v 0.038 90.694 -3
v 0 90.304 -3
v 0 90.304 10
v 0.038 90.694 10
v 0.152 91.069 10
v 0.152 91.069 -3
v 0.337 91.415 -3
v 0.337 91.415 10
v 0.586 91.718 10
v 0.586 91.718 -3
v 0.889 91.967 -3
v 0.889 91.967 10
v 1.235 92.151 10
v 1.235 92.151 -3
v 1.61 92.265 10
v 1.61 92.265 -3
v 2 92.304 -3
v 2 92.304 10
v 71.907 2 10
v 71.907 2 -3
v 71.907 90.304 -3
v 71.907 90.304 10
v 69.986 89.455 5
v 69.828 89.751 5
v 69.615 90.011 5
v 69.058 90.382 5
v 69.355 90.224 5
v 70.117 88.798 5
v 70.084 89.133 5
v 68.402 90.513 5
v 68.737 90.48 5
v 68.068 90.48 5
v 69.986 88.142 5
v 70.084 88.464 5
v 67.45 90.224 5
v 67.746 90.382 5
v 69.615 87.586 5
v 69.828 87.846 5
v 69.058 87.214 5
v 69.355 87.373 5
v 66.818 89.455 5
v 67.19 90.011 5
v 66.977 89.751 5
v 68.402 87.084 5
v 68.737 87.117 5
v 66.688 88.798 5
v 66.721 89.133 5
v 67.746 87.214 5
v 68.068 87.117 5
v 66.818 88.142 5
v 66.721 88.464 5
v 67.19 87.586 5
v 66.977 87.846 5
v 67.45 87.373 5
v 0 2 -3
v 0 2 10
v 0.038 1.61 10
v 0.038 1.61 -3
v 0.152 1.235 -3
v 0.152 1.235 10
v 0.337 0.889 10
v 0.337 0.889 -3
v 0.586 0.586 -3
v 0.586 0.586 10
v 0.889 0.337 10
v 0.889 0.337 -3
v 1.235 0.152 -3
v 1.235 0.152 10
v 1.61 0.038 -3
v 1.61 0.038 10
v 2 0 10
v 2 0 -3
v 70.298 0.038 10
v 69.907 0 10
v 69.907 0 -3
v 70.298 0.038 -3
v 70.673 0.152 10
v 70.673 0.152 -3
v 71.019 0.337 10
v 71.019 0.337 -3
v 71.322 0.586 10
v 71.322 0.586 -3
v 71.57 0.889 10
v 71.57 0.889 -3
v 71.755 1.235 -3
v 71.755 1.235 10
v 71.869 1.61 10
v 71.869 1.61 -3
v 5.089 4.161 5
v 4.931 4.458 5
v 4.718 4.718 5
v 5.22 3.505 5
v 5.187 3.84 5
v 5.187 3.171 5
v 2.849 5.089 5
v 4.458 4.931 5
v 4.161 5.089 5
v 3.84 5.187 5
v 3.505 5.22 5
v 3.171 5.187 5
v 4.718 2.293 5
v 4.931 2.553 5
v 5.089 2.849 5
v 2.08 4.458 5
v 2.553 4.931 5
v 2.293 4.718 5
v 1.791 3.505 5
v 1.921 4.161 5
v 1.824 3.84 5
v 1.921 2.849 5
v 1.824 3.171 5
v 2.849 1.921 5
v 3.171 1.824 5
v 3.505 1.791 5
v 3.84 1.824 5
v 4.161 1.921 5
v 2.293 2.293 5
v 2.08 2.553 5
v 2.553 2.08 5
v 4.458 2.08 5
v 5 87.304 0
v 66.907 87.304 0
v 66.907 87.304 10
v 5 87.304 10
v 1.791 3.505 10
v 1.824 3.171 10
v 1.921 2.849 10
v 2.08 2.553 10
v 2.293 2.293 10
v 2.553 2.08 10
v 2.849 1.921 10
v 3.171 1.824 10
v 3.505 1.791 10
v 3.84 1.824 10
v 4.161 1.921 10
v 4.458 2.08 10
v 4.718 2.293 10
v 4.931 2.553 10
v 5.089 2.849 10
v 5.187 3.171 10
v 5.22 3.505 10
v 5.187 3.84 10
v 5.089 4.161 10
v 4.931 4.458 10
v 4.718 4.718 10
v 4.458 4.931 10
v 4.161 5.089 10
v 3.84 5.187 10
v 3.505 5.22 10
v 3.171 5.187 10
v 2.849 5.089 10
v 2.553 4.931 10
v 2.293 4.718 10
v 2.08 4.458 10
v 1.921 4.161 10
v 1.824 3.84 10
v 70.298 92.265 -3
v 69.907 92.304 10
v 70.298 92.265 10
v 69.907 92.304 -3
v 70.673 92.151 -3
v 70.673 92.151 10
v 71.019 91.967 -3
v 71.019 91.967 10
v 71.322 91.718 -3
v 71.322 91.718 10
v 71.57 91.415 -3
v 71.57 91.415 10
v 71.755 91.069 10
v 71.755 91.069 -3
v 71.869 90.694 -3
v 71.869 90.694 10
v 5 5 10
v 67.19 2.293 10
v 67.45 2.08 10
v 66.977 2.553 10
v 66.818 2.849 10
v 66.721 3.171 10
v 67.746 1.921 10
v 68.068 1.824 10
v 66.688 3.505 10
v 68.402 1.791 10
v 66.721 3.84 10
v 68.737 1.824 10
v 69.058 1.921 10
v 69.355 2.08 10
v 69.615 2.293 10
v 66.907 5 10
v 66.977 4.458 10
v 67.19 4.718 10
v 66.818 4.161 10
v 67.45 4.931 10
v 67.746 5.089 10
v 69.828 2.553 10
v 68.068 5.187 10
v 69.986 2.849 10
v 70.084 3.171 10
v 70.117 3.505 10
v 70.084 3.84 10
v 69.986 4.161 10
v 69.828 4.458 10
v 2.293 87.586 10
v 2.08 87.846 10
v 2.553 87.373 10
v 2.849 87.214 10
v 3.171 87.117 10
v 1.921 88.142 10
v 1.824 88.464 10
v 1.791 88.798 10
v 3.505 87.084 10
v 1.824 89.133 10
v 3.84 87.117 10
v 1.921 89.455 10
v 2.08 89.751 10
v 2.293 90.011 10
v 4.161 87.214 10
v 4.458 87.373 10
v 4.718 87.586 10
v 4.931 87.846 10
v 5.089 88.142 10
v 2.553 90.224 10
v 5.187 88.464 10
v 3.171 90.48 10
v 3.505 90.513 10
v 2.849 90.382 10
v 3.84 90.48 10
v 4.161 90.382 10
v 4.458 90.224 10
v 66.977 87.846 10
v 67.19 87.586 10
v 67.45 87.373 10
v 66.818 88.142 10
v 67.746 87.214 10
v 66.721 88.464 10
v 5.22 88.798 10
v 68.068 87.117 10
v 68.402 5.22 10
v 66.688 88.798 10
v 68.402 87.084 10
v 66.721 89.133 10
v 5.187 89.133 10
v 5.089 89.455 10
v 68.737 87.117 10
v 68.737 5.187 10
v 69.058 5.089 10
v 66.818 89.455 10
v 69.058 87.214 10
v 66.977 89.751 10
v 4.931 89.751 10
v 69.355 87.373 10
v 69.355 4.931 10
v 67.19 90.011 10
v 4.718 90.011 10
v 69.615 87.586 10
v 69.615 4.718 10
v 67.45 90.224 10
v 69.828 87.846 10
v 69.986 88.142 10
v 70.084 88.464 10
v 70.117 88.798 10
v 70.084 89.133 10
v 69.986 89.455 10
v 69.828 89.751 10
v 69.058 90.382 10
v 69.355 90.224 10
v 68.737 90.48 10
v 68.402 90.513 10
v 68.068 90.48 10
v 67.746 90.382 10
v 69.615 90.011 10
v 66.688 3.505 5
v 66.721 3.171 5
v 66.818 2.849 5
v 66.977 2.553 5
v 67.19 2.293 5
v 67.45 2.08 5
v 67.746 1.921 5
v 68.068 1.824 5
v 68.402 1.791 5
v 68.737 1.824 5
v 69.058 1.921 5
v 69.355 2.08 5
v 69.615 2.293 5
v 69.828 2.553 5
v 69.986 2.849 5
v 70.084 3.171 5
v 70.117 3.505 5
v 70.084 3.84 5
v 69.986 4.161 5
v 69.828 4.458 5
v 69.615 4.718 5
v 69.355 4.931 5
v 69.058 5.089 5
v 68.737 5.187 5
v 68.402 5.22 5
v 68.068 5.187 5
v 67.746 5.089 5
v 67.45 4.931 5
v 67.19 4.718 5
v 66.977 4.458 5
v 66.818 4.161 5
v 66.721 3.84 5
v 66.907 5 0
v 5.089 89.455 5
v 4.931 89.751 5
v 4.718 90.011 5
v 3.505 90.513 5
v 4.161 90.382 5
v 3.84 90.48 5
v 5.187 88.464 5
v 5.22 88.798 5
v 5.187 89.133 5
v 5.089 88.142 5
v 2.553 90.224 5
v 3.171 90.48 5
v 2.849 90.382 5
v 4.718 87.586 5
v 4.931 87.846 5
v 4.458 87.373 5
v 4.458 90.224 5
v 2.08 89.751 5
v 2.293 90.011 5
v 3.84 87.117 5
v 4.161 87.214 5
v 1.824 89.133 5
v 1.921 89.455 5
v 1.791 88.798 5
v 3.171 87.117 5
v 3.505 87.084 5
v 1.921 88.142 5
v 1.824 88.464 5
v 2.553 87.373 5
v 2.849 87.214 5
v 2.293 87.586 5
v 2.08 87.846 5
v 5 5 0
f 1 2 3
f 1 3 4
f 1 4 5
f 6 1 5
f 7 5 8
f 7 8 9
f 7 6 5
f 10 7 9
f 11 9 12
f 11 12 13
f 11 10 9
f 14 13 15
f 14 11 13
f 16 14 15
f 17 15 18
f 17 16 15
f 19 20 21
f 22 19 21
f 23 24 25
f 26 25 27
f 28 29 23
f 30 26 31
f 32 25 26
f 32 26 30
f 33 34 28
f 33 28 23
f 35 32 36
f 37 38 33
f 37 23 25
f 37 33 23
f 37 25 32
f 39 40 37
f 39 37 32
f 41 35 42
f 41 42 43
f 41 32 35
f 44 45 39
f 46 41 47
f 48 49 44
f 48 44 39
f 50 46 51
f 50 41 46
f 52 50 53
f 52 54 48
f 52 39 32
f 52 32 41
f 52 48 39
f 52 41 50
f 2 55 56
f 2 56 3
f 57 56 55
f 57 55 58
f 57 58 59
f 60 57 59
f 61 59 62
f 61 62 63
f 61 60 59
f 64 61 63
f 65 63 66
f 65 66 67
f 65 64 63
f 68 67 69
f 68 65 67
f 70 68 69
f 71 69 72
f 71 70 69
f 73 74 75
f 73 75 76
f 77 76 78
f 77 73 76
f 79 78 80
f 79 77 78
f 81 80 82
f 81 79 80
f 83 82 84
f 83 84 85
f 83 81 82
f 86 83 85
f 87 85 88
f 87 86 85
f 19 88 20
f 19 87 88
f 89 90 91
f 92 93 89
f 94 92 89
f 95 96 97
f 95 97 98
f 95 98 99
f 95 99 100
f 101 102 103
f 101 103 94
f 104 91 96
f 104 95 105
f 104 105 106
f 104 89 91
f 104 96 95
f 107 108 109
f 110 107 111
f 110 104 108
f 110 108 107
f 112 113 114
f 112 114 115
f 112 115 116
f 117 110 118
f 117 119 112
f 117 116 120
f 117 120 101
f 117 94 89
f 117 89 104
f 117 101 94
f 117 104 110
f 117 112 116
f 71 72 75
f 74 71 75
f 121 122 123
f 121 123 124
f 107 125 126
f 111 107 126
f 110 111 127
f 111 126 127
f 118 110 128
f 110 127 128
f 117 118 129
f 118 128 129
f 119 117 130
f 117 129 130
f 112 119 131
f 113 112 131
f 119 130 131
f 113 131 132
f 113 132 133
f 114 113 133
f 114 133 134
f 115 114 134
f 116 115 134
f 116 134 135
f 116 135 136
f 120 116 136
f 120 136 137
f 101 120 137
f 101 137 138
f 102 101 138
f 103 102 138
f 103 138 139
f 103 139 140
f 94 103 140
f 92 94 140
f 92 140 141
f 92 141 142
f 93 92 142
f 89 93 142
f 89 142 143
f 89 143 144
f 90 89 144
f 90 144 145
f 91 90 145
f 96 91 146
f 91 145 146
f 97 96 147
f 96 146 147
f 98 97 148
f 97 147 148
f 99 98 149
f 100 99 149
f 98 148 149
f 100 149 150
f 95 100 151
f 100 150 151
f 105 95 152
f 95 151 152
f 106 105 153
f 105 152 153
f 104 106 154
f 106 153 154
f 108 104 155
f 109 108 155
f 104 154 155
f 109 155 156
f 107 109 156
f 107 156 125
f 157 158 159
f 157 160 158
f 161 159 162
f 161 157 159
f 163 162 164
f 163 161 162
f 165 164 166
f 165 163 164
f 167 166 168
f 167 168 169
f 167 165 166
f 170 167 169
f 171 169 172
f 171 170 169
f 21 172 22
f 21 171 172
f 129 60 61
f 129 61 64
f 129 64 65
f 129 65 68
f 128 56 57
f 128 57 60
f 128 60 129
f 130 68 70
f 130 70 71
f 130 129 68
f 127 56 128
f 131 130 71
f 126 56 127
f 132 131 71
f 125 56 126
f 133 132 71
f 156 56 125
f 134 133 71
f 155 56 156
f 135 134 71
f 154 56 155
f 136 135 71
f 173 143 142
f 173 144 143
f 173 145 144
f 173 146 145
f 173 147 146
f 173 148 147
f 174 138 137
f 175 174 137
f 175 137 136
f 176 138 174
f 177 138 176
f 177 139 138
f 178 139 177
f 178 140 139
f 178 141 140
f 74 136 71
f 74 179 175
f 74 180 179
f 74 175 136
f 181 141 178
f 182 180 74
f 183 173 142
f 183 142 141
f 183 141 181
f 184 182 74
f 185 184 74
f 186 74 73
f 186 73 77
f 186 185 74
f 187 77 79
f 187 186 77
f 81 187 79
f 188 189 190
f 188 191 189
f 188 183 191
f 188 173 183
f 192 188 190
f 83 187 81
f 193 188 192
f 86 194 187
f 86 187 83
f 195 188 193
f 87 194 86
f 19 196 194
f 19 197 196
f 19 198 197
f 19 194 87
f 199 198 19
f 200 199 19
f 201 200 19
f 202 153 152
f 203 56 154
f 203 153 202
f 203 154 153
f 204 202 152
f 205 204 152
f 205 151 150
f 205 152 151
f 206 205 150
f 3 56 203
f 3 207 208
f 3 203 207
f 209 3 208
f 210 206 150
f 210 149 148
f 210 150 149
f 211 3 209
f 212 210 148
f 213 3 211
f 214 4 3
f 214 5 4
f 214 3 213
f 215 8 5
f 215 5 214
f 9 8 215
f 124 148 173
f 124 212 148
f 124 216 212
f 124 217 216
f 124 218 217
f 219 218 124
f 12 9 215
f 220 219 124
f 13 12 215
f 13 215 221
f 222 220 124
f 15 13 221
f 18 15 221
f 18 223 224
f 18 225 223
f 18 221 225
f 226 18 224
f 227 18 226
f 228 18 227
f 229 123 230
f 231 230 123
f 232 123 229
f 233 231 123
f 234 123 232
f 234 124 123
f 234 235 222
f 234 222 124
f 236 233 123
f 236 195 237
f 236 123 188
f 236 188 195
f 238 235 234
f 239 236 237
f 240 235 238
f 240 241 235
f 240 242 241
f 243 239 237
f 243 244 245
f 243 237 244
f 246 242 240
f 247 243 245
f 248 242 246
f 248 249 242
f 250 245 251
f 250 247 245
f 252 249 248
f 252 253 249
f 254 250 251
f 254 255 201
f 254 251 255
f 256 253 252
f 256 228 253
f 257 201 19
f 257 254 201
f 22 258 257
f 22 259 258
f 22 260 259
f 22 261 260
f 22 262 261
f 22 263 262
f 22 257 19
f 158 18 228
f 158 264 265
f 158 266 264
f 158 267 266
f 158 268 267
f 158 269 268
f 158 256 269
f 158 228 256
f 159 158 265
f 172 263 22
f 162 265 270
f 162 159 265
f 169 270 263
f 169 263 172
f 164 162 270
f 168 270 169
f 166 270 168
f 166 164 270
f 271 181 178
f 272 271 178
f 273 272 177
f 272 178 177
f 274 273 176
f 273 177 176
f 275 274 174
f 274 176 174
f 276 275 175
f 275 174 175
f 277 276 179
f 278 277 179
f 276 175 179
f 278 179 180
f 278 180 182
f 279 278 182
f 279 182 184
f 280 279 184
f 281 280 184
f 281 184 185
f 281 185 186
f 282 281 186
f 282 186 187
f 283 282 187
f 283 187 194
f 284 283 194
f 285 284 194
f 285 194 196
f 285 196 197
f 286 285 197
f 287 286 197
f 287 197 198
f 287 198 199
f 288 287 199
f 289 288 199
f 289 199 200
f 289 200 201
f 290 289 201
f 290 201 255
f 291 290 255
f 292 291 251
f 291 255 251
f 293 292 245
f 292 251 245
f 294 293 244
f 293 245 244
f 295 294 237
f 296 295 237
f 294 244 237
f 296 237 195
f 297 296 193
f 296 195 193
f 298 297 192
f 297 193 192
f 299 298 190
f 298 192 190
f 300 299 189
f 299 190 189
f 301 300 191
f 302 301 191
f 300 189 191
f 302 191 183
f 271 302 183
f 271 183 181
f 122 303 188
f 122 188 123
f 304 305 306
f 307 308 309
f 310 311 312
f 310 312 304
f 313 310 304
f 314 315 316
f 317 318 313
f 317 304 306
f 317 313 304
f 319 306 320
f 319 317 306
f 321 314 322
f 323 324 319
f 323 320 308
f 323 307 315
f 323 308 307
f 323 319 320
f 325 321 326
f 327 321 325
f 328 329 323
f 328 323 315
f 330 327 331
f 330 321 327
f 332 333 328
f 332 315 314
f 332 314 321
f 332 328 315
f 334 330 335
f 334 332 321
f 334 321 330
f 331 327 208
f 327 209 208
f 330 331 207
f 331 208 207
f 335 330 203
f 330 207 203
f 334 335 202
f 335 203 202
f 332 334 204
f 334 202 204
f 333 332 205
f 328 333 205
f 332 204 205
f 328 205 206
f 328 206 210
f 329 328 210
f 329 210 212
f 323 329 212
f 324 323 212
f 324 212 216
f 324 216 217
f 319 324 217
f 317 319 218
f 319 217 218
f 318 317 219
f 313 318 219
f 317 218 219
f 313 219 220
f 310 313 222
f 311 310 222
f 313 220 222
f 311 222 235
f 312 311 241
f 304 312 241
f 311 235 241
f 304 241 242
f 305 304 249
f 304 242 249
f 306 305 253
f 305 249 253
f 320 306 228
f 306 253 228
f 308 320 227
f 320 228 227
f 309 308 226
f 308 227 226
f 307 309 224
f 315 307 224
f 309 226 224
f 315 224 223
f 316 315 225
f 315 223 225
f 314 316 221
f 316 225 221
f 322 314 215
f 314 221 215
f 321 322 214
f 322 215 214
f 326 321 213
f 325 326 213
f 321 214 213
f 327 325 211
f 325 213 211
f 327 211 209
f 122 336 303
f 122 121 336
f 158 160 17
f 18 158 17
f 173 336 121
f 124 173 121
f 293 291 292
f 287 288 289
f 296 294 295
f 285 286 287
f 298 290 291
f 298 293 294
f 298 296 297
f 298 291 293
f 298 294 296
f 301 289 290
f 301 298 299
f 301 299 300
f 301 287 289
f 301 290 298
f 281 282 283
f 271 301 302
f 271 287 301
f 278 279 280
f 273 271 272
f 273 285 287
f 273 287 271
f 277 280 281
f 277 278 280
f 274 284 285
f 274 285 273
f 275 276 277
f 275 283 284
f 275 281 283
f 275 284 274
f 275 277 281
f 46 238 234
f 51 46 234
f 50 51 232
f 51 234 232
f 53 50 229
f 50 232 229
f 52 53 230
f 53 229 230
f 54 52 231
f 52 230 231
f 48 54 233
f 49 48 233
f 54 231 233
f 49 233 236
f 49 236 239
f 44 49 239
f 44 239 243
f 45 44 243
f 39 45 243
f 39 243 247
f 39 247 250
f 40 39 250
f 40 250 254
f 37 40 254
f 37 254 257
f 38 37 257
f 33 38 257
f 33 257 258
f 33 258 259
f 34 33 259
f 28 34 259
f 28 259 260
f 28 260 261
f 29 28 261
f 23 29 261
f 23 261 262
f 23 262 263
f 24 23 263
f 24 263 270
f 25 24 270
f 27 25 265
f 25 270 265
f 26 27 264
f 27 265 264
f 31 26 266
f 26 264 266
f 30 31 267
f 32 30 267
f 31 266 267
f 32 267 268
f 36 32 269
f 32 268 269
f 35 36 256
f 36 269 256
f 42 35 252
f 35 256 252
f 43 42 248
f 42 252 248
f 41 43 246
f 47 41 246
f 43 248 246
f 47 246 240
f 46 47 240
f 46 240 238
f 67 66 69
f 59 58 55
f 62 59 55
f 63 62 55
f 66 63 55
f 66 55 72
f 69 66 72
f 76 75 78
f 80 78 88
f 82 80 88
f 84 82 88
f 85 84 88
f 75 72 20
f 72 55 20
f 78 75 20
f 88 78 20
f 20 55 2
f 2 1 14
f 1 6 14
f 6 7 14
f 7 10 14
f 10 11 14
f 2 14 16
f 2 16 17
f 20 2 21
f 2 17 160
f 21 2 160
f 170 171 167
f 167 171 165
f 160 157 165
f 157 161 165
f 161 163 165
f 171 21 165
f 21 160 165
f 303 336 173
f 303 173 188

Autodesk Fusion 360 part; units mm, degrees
sketch "Sketch1" plane through (0, 0, 0) normal (0, 0, 1) x (1, 0, 0)
  line L0 (0, 0) -> (0, 92.3036)
  line L1 (0, 0) -> (71.9074, 0)
  line L2 (71.9074, 0) -> (71.9074, 92.3036)
  line L3 (71.9074, 92.3036) -> (0, 92.3036)
  line L4 (5, 5) -> (66.9074, 5)
  line L5 (66.9074, 5) -> (66.9074, 87.3036)
  line L6 (66.9074, 87.3036) -> (5, 87.3036)
  line L7 (5, 5) -> (5, 87.3036)
  dimension "d1" = 92.3036
  dimension "d2" = 71.9074
  dimension "d3" = 5
extrude "Extrude1" add sketch "Sketch1" against normal blind 3 contours L0 L1 L2 L3 | L4 L5 L6 L7
extrude "Extrude2" add sketch "Sketch1" along normal blind 10
fillet "Fillet1" radius 2 4 edges at (71.9074, 0, 3.5) (0, 0, 3.5) (0, 92.3036, 3.5) (71.9074, 92.3036, 3.5)
sketch "Sketch2" plane through (0, 0, 10) normal (0, 0, 1) x (-1, 0, 0)
  line L0 (-66.9074, -87.3036) -> (-66.9074, -5)
  line L1 (-66.9074, -5) -> (-5, -5)
  line L2 (-5, -5) -> (-5, -87.3036)
  line L3 (-5, -87.3036) -> (-66.9074, -87.3036)
  arc A0 (-71.9074, -90.3036) -> (-69.9074, -92.3036) centre (-69.9074, -90.3036) ccw
  line L4 (-69.9074, -92.3036) -> (-2, -92.3036)
  arc A1 (-2, -92.3036) -> (0, -90.3036) centre (-2, -90.3036) ccw
  line L5 (0, -90.3036) -> (0, -2)
  arc A2 (0, -2) -> (-2, 0) centre (-2, -2) ccw
  line L6 (-2, 0) -> (-69.9074, 0)
  arc A3 (-69.9074, 0) -> (-71.9074, -2) centre (-69.9074, -2) ccw
  line L7 (-71.9074, -2) -> (-71.9074, -90.3036)
  circle A4 centre (-68.4022, -3.5052) radius 1.7145
  line L8 (-35.9537, -92.3036) -> (-35.9537, 0)
  circle A5 centre (-3.5052, -3.5052) radius 1.7145
  line L9 (-67.4347, -46.1518) -> (-71.9074, -46.1518)
  line L10 (-67.4347, -46.1518) -> (0, -46.1518)
  circle A6 centre (-68.4022, -88.7984) radius 1.7145
  circle A7 centre (-3.5052, -88.7984) radius 1.7145
  dimension "d12" = 3.429
extrude "Extrude3" cut sketch "Sketch2" against normal blind 5 contours A4 | A5 | A6 | A7
